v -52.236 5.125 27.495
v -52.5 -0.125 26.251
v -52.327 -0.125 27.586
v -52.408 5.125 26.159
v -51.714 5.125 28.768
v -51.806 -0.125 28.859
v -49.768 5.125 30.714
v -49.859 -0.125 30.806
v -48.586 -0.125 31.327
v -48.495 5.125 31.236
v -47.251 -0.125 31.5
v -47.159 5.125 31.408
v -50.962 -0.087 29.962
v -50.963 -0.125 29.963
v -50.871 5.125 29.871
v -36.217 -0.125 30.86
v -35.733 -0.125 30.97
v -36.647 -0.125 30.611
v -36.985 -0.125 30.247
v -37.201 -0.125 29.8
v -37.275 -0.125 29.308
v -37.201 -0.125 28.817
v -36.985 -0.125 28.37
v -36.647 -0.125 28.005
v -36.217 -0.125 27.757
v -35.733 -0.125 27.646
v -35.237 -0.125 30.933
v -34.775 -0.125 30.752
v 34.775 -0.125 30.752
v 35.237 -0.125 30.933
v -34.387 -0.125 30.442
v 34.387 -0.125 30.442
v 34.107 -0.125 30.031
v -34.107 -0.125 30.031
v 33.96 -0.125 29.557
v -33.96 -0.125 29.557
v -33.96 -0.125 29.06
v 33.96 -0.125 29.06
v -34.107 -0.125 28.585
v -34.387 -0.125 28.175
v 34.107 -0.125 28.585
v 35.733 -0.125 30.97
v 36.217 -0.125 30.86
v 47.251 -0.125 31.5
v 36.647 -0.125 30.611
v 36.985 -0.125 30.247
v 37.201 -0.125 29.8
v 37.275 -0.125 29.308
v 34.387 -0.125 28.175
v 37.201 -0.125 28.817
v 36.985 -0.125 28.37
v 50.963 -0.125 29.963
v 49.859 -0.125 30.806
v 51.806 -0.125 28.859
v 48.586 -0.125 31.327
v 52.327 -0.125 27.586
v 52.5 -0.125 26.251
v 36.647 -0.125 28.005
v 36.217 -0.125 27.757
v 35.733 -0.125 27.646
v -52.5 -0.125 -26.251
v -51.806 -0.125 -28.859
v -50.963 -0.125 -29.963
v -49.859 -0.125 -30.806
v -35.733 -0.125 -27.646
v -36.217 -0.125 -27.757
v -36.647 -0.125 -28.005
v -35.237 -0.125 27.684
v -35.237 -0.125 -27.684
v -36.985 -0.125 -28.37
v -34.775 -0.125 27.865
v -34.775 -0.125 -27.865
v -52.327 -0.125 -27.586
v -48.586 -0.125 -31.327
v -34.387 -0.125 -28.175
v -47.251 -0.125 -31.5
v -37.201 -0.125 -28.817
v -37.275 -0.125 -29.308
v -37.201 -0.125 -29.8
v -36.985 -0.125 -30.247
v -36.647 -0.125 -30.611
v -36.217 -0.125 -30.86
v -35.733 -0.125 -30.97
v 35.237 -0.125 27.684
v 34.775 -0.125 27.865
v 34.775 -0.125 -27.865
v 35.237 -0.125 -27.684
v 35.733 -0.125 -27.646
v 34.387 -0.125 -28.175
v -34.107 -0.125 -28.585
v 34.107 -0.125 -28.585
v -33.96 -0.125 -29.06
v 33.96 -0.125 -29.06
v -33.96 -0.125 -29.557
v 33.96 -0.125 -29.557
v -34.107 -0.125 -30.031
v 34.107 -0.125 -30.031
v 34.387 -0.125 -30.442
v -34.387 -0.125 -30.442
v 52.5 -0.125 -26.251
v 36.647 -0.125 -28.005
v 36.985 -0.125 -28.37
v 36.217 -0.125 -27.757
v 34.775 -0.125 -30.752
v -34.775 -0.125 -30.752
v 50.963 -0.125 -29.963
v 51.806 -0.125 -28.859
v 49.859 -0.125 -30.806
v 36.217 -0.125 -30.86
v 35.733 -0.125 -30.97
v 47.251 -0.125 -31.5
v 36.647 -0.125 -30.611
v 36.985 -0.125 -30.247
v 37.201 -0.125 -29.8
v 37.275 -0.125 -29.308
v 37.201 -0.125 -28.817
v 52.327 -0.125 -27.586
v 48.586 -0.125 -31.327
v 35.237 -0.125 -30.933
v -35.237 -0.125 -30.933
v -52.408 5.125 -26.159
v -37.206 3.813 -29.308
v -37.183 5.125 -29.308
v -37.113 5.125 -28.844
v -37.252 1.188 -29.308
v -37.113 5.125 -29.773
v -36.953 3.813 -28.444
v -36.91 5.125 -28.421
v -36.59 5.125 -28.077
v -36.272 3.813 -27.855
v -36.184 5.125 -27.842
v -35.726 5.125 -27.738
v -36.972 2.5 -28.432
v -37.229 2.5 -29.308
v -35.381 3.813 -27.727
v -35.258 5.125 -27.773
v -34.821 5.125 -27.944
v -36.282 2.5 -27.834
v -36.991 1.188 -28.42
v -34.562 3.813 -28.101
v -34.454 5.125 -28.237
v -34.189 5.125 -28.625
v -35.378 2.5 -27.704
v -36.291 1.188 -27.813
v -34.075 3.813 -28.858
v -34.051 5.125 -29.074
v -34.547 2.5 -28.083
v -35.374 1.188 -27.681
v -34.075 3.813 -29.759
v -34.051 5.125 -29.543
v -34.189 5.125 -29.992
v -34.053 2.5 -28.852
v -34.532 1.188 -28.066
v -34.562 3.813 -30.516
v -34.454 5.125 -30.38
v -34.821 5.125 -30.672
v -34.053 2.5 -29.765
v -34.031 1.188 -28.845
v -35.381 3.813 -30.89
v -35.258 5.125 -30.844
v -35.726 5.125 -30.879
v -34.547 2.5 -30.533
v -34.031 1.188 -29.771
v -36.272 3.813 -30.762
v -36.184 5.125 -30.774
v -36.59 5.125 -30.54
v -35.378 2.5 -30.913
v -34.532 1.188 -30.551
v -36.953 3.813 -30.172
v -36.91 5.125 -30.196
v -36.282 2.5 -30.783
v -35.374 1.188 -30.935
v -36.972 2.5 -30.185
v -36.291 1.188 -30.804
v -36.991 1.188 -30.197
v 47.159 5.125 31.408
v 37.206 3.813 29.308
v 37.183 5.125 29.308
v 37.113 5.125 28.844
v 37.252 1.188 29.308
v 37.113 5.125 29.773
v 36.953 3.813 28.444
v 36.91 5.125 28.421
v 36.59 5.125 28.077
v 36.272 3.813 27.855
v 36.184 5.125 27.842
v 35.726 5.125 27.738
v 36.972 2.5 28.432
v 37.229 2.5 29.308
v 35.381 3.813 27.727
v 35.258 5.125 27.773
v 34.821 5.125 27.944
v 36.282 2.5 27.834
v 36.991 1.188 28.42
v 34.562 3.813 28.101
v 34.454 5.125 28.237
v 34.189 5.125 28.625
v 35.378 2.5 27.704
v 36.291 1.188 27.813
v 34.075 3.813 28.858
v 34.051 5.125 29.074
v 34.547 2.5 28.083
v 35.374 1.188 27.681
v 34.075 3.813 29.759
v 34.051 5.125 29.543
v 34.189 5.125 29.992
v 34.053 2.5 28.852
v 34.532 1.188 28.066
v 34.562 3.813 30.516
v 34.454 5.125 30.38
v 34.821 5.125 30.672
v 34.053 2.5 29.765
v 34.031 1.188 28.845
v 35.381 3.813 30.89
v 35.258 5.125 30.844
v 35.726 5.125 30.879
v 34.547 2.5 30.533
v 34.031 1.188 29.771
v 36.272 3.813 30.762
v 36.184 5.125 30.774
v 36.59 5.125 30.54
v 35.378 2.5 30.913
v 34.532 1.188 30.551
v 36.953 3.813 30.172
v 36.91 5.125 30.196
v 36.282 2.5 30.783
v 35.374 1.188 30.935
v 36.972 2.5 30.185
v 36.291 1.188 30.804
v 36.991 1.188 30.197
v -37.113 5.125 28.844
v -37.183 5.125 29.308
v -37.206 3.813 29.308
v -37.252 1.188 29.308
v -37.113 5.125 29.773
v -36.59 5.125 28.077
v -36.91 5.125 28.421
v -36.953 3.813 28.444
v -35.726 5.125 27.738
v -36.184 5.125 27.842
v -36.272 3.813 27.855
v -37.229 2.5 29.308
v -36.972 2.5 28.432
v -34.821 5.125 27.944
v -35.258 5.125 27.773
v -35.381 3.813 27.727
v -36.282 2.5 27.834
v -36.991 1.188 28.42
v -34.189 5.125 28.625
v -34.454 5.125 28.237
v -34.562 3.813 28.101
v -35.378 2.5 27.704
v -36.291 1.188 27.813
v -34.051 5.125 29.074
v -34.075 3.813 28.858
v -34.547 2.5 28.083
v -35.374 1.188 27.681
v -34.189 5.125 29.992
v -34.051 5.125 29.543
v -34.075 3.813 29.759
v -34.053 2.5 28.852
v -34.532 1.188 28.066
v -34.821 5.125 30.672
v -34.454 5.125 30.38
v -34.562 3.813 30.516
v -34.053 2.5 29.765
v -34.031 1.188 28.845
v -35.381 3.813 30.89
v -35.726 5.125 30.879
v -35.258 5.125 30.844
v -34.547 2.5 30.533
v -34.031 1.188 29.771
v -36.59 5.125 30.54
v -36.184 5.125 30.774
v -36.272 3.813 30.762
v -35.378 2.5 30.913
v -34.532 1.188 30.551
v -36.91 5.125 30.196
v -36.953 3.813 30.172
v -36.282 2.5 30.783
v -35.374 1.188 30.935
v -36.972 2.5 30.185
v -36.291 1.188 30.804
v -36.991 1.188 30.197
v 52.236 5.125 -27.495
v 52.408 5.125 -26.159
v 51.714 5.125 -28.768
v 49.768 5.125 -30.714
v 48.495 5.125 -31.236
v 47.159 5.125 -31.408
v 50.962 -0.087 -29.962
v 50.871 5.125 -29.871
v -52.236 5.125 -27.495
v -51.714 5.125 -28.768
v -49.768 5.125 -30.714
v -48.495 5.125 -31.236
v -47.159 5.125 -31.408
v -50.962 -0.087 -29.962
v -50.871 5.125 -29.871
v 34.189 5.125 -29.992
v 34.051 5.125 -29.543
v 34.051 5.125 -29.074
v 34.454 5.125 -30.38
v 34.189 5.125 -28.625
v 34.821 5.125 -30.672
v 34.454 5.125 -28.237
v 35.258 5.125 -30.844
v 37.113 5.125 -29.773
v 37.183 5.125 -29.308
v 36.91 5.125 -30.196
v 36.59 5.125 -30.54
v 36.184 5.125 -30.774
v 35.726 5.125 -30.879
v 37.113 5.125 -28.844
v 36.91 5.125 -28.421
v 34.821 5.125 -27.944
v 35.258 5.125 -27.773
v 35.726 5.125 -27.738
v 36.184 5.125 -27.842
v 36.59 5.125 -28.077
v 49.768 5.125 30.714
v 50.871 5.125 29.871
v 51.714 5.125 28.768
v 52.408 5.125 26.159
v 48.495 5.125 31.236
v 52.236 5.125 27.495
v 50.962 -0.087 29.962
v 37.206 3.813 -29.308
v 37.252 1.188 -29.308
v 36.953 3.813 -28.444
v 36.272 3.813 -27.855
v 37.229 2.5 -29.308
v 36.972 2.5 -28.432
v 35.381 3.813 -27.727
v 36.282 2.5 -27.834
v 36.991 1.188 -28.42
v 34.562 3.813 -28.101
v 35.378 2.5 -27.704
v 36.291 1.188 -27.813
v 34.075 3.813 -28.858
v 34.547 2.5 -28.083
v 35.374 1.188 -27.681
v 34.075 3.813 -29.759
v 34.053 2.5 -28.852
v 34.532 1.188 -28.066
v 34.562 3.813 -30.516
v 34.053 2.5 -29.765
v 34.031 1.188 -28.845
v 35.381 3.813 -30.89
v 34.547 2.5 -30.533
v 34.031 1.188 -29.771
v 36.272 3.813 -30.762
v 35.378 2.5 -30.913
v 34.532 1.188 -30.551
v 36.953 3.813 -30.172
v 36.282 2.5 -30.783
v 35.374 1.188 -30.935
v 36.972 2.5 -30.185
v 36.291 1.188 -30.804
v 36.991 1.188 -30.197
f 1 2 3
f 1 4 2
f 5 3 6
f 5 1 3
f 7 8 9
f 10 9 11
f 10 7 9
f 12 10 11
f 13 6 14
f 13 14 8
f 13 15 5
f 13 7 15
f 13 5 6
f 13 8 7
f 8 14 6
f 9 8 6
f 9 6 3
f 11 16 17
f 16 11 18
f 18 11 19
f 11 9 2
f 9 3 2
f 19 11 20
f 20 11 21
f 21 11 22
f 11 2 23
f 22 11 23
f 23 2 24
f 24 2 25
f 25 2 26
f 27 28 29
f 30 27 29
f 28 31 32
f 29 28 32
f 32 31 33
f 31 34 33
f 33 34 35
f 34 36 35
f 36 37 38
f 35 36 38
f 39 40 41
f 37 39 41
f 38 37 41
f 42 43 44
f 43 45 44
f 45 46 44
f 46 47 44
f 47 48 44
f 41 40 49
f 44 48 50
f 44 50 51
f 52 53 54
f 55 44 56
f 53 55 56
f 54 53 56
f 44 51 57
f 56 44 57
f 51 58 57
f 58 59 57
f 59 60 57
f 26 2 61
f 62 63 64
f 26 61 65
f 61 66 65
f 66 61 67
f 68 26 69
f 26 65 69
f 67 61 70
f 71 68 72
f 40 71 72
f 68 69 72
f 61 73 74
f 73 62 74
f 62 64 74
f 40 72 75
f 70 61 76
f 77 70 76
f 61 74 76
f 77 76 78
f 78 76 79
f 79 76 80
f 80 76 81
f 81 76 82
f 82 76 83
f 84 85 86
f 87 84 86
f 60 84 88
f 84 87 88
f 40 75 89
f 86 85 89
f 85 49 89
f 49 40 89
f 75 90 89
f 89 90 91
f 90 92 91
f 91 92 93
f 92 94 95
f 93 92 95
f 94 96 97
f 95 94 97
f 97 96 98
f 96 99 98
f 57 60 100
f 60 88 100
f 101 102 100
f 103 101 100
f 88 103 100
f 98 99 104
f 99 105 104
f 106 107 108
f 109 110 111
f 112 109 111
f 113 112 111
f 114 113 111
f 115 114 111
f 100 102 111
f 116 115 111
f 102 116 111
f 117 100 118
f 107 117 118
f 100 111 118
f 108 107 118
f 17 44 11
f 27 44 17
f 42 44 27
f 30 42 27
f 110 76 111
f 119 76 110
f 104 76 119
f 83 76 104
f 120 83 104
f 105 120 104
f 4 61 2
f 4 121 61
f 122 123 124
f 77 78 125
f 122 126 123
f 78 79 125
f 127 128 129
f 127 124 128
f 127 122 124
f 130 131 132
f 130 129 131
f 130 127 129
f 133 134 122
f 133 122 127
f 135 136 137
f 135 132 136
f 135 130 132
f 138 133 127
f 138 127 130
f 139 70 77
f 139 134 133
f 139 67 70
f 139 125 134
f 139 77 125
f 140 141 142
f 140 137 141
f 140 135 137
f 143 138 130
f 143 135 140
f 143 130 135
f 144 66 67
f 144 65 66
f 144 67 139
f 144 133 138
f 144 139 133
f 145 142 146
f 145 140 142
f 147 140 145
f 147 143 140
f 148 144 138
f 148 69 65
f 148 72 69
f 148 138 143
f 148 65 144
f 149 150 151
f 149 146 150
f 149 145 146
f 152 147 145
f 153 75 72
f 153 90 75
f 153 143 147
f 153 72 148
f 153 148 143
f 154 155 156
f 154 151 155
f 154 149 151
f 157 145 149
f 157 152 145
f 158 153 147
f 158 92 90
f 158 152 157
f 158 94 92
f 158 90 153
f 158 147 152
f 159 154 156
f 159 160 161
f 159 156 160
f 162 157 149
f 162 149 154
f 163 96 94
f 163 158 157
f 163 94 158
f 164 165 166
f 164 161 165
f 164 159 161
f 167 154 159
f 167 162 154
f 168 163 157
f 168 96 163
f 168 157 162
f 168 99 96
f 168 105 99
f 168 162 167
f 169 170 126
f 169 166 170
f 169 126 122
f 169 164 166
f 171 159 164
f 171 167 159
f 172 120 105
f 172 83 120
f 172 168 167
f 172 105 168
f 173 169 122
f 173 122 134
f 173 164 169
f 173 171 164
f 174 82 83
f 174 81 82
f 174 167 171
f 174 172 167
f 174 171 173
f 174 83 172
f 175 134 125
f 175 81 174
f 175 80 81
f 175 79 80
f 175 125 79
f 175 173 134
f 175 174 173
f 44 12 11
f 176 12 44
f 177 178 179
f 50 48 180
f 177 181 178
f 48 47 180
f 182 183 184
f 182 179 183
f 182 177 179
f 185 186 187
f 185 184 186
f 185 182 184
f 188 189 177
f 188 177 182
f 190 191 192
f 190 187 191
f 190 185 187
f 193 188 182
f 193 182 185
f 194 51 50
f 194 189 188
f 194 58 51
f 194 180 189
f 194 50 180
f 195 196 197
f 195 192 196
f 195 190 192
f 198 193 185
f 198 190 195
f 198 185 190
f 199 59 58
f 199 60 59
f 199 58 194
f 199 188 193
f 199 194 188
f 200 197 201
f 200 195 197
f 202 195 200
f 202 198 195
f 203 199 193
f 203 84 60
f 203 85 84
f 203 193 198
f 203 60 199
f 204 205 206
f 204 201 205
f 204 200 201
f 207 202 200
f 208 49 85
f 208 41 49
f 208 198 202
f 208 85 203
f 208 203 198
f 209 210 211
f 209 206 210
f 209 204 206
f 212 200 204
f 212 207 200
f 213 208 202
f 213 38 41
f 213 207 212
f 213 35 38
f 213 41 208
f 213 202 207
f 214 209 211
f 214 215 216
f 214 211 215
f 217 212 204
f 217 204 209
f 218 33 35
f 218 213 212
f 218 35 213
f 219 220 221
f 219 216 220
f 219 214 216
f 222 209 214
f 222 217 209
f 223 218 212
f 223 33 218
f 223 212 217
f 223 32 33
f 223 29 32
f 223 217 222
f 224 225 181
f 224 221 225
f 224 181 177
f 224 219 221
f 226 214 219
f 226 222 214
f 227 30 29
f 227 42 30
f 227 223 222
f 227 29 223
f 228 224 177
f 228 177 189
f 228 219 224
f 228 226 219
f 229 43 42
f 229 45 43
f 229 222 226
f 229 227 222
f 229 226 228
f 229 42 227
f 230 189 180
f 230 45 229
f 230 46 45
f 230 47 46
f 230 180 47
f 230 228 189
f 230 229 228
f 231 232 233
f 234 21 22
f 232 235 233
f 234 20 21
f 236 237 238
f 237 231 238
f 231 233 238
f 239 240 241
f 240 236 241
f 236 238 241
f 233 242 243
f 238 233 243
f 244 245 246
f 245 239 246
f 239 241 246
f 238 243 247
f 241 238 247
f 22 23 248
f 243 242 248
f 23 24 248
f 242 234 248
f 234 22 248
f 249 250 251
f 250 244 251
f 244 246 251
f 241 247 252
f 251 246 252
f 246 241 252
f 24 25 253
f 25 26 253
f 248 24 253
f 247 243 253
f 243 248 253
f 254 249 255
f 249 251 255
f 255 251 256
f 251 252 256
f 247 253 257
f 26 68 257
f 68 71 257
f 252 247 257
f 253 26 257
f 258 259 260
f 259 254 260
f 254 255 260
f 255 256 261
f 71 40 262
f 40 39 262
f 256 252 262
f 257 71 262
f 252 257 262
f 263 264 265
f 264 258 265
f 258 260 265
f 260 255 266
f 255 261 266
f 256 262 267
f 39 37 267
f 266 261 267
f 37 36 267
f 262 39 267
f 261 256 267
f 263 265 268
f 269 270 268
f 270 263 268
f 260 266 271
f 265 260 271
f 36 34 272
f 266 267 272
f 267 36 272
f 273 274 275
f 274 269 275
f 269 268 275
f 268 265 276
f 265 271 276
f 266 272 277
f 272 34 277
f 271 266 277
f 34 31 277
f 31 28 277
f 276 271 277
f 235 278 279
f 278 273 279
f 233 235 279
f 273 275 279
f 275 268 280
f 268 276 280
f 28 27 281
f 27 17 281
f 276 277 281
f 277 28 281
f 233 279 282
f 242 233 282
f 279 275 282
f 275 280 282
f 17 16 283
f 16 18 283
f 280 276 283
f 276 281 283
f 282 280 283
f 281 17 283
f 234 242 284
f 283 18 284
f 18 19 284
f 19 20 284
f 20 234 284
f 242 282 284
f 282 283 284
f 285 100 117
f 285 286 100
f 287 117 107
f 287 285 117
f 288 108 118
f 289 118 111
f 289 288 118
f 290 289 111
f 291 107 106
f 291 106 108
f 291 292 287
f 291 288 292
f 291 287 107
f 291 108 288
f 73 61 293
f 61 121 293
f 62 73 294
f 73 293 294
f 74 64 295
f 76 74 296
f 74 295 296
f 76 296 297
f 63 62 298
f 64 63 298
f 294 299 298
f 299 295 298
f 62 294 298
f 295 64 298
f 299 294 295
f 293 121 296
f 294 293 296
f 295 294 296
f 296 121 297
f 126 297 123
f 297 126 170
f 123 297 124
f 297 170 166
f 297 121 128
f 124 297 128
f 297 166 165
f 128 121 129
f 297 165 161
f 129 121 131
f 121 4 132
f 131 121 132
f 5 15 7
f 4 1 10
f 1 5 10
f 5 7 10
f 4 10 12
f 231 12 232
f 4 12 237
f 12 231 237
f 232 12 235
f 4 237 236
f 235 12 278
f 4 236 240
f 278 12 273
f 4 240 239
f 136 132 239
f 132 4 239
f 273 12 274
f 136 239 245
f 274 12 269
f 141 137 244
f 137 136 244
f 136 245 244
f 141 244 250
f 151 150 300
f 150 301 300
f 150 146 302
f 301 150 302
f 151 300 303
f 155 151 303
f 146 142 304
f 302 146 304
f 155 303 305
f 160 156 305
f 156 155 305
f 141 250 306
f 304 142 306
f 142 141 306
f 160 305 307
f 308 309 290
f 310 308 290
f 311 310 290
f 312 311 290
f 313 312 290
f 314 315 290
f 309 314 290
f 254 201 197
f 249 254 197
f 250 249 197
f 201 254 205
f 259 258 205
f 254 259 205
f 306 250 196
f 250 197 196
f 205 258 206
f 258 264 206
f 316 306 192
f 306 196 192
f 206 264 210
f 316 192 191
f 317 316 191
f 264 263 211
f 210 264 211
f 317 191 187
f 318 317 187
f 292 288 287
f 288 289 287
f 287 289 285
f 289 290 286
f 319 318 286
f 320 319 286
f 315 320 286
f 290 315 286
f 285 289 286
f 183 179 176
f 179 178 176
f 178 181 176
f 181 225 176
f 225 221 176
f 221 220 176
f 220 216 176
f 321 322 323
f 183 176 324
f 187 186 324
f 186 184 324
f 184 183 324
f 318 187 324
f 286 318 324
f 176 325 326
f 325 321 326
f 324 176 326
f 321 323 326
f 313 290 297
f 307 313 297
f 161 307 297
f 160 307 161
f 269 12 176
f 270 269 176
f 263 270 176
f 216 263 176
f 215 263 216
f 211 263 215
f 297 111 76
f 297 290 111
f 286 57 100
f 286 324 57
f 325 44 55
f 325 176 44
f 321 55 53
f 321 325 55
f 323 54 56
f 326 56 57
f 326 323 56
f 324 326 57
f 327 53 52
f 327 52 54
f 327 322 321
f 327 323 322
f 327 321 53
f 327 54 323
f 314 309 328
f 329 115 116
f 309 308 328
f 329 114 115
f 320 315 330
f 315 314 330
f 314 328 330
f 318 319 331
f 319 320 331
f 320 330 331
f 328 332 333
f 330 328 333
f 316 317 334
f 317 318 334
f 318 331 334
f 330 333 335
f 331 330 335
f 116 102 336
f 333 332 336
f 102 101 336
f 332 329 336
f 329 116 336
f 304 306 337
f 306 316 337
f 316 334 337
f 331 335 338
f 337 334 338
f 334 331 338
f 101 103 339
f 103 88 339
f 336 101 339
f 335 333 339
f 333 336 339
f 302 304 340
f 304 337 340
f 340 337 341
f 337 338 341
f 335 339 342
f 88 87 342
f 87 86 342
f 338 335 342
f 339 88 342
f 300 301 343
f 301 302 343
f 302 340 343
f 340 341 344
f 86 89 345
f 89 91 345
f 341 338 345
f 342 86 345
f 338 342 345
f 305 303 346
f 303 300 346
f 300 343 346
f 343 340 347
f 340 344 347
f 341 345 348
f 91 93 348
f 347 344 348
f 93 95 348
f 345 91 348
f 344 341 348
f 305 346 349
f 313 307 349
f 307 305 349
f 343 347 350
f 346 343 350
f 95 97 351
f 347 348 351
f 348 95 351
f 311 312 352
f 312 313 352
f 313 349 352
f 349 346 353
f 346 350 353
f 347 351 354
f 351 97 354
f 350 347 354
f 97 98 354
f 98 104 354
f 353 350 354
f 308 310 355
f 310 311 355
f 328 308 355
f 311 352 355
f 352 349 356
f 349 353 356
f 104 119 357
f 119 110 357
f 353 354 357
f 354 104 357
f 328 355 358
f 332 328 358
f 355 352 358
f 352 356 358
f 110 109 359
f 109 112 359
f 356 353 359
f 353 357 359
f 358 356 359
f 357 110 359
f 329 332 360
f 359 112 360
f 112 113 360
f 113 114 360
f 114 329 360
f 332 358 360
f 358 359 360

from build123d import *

# Parameters (mm, degrees)
SKETCH1_W               = 100
SKETCH1_H               = 60
BOSS_EXTRUDE1_DEPTH     = 5
BOSS_EXTRUDE1_TAPER     = 1
FILLET1_R               = 5
SKETCH2_R               = 1.5
CUT_EXTRUDE1_DEPTH      = 5
CUT_EXTRUDE1_TAPER      = -1
MIRROR2_COPY_1_SKETCH_R = 1.5
MIRROR2_COPY_1_DEPTH    = 5
MIRROR2_COPY_1_TAPER    = -1
SCALE1_SCALE            = 1.05


with BuildPart() as part:
    # Sketch1 → Boss-Extrude1 (new body)
    with BuildSketch(Plane(origin=(0, 0, 0), x_dir=(1, 0, 0), z_dir=(0, 1, 0))):
        Rectangle(SKETCH1_W, SKETCH1_H)
    extrude(amount=BOSS_EXTRUDE1_DEPTH, taper=BOSS_EXTRUDE1_TAPER)

    # Fillet1
    fillet1_edges = [part.edges().sort_by_distance(p)[0] for p in [
        (49.956362338, 2.5, 29.956362338),
        (-49.956362338, 2.5, 29.956362338),
        (-49.956362338, 2.5, -29.956362338),
        (49.956362338, 2.5, -29.956362338),
    ]]
    fillet(fillet1_edges, radius=FILLET1_R)

    # Sketch2 → Cut-Extrude1 (cut)
    with BuildSketch(Plane(origin=(0, 5, 0), x_dir=(1, 0, 0), z_dir=(0, 1, 0))):
        with Locations((33.912724675, -27.912724675)):
            Circle(SKETCH2_R)
    cut_extrude1 = extrude(amount=-CUT_EXTRUDE1_DEPTH, taper=CUT_EXTRUDE1_TAPER, mode=Mode.SUBTRACT)

    # Mirror1: Cut-Extrude1 across plane
    add(cut_extrude1.mirror(Plane.XY), mode=Mode.SUBTRACT)

    # Mirror2: Cut-Extrude1 across plane
    add(cut_extrude1.mirror(Plane(origin=(0, 0, 0), x_dir=(0, 0, 1), z_dir=(1, 0, 0))), mode=Mode.SUBTRACT)

    # Mirror2 copy 1 sketch → Mirror2 copy 1 (cut)
    with BuildSketch(Plane(origin=(0, 5, 0), x_dir=(-1, 0, 0), z_dir=(0, 1, 0))):
        with Locations((33.912724675, -27.912724675)):
            Circle(MIRROR2_COPY_1_SKETCH_R)
    extrude(amount=-MIRROR2_COPY_1_DEPTH, taper=MIRROR2_COPY_1_TAPER, mode=Mode.SUBTRACT)


with BuildPart() as part_1:
    # Scale1: scaled about (-4.1e-08, 2.498279052, 6.8e-08)
    add(part.part.scale(SCALE1_SCALE).moved(Location((2e-09, -0.124913953, -3e-09))))


solid = part_1.part
